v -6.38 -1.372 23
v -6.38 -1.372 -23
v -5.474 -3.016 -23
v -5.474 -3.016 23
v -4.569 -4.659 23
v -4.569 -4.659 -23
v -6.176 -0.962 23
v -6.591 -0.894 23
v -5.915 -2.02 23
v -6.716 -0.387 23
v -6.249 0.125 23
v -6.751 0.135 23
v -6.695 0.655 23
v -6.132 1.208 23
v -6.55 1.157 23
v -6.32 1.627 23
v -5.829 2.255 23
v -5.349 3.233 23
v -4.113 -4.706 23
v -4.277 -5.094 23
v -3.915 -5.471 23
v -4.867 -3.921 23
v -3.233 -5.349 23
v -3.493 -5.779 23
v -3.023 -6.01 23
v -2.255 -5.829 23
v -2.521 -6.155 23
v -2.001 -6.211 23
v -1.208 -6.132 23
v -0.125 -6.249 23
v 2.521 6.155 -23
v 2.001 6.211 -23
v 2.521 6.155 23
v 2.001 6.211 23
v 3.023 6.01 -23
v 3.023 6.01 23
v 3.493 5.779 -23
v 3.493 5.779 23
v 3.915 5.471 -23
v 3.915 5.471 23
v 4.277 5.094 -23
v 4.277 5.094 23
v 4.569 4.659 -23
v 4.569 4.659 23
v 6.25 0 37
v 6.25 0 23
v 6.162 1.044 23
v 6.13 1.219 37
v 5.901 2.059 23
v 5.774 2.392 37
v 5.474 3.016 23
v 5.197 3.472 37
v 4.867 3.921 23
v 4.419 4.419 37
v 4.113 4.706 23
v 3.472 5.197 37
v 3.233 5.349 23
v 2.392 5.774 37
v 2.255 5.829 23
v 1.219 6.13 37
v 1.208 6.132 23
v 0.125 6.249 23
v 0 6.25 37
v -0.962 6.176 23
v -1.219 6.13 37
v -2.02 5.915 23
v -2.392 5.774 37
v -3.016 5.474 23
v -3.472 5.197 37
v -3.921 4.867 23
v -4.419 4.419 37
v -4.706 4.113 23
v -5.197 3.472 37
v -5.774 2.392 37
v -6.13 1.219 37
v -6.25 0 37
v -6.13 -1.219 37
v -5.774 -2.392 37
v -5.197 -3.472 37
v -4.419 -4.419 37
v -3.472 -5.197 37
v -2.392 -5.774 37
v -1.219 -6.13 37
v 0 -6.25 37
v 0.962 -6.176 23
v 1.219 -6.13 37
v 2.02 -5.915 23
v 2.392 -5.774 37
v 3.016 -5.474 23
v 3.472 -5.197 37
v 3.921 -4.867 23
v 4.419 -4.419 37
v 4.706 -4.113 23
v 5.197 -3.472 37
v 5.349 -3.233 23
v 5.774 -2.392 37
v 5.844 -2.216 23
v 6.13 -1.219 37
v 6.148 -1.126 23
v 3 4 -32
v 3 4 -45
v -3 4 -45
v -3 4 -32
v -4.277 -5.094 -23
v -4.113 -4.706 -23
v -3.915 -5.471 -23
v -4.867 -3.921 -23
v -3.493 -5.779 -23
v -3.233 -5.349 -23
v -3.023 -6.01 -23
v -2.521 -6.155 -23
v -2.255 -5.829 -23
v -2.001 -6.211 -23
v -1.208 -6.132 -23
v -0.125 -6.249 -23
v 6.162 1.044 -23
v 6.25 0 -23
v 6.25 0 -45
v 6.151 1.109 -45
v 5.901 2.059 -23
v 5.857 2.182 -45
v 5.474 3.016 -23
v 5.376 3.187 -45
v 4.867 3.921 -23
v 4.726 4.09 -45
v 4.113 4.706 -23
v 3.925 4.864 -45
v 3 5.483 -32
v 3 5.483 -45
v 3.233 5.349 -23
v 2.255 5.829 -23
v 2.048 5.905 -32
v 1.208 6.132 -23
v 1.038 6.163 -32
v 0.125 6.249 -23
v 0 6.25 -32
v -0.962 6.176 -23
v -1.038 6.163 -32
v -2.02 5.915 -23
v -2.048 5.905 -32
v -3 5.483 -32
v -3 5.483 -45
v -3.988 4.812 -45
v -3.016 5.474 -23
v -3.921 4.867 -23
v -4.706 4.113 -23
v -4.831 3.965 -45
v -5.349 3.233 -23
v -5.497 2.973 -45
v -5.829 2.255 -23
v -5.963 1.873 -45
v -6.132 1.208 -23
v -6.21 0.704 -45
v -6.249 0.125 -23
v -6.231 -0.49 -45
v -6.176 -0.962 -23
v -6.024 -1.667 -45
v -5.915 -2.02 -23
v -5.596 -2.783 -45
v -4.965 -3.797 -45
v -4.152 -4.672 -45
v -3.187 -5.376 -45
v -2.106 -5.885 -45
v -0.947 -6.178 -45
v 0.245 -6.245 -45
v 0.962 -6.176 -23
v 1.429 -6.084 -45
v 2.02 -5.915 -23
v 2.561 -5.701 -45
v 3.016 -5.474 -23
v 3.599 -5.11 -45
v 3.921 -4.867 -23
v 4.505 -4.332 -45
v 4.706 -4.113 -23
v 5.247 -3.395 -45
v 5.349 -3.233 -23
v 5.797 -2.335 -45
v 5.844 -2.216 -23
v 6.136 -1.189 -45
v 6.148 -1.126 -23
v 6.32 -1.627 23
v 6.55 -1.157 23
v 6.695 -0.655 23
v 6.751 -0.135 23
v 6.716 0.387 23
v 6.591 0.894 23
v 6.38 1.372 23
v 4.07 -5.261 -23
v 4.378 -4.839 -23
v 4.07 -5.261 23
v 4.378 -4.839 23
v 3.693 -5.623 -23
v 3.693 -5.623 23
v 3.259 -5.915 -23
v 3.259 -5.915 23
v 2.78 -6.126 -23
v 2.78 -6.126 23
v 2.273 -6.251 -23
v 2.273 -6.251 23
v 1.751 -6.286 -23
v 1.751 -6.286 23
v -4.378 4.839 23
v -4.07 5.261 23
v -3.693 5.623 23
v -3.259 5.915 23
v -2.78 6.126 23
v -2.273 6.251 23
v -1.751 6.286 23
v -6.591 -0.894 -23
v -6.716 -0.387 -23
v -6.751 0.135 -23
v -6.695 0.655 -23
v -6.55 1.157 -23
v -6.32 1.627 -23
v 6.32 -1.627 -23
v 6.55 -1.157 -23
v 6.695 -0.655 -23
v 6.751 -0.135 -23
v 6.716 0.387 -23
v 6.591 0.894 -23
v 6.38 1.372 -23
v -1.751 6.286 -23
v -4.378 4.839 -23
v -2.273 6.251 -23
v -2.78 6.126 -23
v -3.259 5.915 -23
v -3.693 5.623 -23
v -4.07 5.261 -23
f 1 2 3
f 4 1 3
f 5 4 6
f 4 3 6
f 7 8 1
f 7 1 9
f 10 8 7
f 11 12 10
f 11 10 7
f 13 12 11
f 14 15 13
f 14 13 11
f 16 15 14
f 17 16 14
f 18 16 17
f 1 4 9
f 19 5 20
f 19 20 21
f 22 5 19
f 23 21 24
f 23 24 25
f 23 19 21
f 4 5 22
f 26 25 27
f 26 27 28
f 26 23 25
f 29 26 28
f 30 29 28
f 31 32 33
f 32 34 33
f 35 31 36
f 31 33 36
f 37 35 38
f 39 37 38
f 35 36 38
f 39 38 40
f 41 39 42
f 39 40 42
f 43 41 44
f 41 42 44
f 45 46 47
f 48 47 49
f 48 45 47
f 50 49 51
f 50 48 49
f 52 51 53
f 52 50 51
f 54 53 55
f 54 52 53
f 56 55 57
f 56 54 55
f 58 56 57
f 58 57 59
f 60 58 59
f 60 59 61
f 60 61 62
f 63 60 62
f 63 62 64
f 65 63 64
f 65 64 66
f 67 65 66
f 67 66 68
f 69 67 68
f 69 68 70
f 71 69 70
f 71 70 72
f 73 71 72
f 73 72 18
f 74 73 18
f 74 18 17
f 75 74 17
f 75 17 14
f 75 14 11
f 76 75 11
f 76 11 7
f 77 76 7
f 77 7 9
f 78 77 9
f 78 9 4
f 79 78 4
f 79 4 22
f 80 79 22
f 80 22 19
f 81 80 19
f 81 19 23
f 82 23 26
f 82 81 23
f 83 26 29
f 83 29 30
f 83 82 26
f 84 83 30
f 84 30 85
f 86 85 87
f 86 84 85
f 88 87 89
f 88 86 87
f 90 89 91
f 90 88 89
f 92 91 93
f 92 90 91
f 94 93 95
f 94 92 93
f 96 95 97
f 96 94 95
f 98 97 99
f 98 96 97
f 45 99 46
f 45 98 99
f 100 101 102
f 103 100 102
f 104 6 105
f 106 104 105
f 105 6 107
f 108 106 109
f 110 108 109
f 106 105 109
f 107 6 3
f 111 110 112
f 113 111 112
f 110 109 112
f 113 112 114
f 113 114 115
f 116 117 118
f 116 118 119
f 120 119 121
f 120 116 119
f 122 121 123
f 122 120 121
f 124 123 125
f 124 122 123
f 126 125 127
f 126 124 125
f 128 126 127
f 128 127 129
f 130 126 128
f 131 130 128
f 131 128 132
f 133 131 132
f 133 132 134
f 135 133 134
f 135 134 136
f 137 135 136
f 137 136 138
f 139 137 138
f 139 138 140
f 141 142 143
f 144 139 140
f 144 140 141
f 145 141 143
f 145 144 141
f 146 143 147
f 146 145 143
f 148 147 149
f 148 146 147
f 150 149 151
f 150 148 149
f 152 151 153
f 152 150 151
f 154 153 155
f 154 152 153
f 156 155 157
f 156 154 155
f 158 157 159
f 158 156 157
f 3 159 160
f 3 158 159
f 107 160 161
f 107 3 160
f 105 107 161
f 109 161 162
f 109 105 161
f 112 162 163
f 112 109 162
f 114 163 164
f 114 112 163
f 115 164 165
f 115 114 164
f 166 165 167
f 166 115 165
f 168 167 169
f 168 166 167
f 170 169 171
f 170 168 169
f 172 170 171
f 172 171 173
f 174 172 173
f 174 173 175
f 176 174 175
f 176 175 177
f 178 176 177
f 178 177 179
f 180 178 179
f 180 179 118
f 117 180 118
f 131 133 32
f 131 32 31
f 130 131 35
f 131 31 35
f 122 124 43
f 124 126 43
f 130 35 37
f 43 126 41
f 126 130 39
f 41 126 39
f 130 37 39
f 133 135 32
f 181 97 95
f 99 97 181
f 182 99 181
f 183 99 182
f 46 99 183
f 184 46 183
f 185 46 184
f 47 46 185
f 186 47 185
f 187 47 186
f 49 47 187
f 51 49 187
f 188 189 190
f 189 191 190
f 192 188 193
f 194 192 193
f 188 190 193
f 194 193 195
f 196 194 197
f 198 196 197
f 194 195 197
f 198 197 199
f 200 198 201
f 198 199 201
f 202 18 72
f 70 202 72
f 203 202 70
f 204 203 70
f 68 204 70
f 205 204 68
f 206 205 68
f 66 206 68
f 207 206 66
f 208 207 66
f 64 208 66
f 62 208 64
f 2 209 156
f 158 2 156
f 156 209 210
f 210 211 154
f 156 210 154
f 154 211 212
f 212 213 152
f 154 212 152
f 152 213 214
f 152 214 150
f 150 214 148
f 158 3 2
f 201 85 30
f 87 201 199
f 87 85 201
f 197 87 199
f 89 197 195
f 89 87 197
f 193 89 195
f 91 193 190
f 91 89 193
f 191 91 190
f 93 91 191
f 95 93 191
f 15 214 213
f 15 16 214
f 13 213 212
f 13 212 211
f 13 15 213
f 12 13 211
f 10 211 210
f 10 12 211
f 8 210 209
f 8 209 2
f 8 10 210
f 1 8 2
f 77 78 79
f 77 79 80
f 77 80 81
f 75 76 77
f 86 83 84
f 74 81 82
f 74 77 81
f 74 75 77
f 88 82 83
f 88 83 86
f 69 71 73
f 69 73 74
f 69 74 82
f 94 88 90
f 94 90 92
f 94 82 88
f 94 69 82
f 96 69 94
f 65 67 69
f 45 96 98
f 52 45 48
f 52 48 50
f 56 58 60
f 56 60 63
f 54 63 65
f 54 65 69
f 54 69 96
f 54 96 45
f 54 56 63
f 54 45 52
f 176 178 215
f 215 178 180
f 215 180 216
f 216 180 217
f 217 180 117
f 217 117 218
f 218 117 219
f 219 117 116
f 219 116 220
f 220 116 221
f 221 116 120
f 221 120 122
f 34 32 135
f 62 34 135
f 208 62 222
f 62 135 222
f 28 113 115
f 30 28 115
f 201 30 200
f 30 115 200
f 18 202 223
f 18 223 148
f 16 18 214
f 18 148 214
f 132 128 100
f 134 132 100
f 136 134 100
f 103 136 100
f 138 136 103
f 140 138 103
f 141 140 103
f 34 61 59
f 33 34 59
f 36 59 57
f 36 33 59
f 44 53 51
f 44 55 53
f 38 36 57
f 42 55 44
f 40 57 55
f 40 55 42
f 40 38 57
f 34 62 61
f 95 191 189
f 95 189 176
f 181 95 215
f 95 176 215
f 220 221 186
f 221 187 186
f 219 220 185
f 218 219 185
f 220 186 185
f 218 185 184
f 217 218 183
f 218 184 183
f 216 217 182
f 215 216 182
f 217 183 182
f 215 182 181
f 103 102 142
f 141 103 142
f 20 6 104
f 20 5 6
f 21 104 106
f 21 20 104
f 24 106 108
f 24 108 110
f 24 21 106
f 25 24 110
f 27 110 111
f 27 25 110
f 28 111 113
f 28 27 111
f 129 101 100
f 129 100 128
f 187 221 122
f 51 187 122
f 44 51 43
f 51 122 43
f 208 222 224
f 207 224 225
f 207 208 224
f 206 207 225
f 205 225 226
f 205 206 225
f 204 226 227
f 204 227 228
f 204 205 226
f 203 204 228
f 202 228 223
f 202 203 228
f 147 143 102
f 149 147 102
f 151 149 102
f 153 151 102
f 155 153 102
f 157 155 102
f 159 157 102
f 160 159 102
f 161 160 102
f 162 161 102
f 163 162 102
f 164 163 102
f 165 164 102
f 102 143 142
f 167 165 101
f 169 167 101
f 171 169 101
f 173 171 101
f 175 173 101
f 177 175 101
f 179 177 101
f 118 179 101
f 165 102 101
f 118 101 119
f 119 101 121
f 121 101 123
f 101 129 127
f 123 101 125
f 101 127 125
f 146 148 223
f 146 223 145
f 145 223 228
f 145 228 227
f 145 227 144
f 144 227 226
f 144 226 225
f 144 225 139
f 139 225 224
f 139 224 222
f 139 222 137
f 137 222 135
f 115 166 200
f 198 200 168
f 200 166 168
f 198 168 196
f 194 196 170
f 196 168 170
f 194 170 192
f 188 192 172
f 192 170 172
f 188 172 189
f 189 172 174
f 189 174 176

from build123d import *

# Parameters (mm, degrees)
SKETCH1_R                = 6.25
BOSS_EXTRUDE1_DEPTH      = 37
BOSS_EXTRUDE1_DEPTH_BACK = 45
SKETCH4_W                = 6
SKETCH4_H                = 4.5
CUT_EXTRUDE1_DEPTH       = 13
BOSS_EXTRUDE2_DEPTH      = 46
FILLET1_R                = 3


with BuildPart() as part:
    # Sketch1 → Boss-Extrude1 (new body, two sides)
    with BuildSketch(Plane.XY) as boss_extrude1_sk:
        Circle(SKETCH1_R)
    extrude(amount=BOSS_EXTRUDE1_DEPTH)
    extrude(boss_extrude1_sk.sketch, amount=-BOSS_EXTRUDE1_DEPTH_BACK)

    # Sketch4 → Cut-Extrude1 (cut)
    with BuildSketch(Plane(origin=(0, 0, -45), x_dir=(-1, 0, 0), z_dir=(0, 0, -1))):
        with Locations((0, 6.25)):
            Rectangle(SKETCH4_W, SKETCH4_H)
    extrude(amount=-CUT_EXTRUDE1_DEPTH, mode=Mode.SUBTRACT)

    # Sketch5 → Boss-Extrude2 (add)
    with BuildSketch(Plane.XY.offset(-23)):
        Polygon((3.732897661, 6.176472163), (-3.482532969, 6.321020286), (-7.21543063, 0.144548123), (-3.732897661, -6.176472163), (3.482532969, -6.321020286), (7.21543063, -0.144548123), align=None)
    extrude(amount=BOSS_EXTRUDE2_DEPTH)

    # Fillet1
    fillet1_edges = [part.edges().sort_by_distance(p)[0] for p in [
        (7.21543063, -0.144548123, 0),
        (3.732897661, 6.176472163, 0),
        (-3.482532969, 6.321020286, 0),
        (-7.21543063, 0.144548123, 0),
        (-3.732897661, -6.176472163, 0),
        (3.482532969, -6.321020286, 0),
    ]]
    fillet(fillet1_edges, radius=FILLET1_R)


solid = part.part
